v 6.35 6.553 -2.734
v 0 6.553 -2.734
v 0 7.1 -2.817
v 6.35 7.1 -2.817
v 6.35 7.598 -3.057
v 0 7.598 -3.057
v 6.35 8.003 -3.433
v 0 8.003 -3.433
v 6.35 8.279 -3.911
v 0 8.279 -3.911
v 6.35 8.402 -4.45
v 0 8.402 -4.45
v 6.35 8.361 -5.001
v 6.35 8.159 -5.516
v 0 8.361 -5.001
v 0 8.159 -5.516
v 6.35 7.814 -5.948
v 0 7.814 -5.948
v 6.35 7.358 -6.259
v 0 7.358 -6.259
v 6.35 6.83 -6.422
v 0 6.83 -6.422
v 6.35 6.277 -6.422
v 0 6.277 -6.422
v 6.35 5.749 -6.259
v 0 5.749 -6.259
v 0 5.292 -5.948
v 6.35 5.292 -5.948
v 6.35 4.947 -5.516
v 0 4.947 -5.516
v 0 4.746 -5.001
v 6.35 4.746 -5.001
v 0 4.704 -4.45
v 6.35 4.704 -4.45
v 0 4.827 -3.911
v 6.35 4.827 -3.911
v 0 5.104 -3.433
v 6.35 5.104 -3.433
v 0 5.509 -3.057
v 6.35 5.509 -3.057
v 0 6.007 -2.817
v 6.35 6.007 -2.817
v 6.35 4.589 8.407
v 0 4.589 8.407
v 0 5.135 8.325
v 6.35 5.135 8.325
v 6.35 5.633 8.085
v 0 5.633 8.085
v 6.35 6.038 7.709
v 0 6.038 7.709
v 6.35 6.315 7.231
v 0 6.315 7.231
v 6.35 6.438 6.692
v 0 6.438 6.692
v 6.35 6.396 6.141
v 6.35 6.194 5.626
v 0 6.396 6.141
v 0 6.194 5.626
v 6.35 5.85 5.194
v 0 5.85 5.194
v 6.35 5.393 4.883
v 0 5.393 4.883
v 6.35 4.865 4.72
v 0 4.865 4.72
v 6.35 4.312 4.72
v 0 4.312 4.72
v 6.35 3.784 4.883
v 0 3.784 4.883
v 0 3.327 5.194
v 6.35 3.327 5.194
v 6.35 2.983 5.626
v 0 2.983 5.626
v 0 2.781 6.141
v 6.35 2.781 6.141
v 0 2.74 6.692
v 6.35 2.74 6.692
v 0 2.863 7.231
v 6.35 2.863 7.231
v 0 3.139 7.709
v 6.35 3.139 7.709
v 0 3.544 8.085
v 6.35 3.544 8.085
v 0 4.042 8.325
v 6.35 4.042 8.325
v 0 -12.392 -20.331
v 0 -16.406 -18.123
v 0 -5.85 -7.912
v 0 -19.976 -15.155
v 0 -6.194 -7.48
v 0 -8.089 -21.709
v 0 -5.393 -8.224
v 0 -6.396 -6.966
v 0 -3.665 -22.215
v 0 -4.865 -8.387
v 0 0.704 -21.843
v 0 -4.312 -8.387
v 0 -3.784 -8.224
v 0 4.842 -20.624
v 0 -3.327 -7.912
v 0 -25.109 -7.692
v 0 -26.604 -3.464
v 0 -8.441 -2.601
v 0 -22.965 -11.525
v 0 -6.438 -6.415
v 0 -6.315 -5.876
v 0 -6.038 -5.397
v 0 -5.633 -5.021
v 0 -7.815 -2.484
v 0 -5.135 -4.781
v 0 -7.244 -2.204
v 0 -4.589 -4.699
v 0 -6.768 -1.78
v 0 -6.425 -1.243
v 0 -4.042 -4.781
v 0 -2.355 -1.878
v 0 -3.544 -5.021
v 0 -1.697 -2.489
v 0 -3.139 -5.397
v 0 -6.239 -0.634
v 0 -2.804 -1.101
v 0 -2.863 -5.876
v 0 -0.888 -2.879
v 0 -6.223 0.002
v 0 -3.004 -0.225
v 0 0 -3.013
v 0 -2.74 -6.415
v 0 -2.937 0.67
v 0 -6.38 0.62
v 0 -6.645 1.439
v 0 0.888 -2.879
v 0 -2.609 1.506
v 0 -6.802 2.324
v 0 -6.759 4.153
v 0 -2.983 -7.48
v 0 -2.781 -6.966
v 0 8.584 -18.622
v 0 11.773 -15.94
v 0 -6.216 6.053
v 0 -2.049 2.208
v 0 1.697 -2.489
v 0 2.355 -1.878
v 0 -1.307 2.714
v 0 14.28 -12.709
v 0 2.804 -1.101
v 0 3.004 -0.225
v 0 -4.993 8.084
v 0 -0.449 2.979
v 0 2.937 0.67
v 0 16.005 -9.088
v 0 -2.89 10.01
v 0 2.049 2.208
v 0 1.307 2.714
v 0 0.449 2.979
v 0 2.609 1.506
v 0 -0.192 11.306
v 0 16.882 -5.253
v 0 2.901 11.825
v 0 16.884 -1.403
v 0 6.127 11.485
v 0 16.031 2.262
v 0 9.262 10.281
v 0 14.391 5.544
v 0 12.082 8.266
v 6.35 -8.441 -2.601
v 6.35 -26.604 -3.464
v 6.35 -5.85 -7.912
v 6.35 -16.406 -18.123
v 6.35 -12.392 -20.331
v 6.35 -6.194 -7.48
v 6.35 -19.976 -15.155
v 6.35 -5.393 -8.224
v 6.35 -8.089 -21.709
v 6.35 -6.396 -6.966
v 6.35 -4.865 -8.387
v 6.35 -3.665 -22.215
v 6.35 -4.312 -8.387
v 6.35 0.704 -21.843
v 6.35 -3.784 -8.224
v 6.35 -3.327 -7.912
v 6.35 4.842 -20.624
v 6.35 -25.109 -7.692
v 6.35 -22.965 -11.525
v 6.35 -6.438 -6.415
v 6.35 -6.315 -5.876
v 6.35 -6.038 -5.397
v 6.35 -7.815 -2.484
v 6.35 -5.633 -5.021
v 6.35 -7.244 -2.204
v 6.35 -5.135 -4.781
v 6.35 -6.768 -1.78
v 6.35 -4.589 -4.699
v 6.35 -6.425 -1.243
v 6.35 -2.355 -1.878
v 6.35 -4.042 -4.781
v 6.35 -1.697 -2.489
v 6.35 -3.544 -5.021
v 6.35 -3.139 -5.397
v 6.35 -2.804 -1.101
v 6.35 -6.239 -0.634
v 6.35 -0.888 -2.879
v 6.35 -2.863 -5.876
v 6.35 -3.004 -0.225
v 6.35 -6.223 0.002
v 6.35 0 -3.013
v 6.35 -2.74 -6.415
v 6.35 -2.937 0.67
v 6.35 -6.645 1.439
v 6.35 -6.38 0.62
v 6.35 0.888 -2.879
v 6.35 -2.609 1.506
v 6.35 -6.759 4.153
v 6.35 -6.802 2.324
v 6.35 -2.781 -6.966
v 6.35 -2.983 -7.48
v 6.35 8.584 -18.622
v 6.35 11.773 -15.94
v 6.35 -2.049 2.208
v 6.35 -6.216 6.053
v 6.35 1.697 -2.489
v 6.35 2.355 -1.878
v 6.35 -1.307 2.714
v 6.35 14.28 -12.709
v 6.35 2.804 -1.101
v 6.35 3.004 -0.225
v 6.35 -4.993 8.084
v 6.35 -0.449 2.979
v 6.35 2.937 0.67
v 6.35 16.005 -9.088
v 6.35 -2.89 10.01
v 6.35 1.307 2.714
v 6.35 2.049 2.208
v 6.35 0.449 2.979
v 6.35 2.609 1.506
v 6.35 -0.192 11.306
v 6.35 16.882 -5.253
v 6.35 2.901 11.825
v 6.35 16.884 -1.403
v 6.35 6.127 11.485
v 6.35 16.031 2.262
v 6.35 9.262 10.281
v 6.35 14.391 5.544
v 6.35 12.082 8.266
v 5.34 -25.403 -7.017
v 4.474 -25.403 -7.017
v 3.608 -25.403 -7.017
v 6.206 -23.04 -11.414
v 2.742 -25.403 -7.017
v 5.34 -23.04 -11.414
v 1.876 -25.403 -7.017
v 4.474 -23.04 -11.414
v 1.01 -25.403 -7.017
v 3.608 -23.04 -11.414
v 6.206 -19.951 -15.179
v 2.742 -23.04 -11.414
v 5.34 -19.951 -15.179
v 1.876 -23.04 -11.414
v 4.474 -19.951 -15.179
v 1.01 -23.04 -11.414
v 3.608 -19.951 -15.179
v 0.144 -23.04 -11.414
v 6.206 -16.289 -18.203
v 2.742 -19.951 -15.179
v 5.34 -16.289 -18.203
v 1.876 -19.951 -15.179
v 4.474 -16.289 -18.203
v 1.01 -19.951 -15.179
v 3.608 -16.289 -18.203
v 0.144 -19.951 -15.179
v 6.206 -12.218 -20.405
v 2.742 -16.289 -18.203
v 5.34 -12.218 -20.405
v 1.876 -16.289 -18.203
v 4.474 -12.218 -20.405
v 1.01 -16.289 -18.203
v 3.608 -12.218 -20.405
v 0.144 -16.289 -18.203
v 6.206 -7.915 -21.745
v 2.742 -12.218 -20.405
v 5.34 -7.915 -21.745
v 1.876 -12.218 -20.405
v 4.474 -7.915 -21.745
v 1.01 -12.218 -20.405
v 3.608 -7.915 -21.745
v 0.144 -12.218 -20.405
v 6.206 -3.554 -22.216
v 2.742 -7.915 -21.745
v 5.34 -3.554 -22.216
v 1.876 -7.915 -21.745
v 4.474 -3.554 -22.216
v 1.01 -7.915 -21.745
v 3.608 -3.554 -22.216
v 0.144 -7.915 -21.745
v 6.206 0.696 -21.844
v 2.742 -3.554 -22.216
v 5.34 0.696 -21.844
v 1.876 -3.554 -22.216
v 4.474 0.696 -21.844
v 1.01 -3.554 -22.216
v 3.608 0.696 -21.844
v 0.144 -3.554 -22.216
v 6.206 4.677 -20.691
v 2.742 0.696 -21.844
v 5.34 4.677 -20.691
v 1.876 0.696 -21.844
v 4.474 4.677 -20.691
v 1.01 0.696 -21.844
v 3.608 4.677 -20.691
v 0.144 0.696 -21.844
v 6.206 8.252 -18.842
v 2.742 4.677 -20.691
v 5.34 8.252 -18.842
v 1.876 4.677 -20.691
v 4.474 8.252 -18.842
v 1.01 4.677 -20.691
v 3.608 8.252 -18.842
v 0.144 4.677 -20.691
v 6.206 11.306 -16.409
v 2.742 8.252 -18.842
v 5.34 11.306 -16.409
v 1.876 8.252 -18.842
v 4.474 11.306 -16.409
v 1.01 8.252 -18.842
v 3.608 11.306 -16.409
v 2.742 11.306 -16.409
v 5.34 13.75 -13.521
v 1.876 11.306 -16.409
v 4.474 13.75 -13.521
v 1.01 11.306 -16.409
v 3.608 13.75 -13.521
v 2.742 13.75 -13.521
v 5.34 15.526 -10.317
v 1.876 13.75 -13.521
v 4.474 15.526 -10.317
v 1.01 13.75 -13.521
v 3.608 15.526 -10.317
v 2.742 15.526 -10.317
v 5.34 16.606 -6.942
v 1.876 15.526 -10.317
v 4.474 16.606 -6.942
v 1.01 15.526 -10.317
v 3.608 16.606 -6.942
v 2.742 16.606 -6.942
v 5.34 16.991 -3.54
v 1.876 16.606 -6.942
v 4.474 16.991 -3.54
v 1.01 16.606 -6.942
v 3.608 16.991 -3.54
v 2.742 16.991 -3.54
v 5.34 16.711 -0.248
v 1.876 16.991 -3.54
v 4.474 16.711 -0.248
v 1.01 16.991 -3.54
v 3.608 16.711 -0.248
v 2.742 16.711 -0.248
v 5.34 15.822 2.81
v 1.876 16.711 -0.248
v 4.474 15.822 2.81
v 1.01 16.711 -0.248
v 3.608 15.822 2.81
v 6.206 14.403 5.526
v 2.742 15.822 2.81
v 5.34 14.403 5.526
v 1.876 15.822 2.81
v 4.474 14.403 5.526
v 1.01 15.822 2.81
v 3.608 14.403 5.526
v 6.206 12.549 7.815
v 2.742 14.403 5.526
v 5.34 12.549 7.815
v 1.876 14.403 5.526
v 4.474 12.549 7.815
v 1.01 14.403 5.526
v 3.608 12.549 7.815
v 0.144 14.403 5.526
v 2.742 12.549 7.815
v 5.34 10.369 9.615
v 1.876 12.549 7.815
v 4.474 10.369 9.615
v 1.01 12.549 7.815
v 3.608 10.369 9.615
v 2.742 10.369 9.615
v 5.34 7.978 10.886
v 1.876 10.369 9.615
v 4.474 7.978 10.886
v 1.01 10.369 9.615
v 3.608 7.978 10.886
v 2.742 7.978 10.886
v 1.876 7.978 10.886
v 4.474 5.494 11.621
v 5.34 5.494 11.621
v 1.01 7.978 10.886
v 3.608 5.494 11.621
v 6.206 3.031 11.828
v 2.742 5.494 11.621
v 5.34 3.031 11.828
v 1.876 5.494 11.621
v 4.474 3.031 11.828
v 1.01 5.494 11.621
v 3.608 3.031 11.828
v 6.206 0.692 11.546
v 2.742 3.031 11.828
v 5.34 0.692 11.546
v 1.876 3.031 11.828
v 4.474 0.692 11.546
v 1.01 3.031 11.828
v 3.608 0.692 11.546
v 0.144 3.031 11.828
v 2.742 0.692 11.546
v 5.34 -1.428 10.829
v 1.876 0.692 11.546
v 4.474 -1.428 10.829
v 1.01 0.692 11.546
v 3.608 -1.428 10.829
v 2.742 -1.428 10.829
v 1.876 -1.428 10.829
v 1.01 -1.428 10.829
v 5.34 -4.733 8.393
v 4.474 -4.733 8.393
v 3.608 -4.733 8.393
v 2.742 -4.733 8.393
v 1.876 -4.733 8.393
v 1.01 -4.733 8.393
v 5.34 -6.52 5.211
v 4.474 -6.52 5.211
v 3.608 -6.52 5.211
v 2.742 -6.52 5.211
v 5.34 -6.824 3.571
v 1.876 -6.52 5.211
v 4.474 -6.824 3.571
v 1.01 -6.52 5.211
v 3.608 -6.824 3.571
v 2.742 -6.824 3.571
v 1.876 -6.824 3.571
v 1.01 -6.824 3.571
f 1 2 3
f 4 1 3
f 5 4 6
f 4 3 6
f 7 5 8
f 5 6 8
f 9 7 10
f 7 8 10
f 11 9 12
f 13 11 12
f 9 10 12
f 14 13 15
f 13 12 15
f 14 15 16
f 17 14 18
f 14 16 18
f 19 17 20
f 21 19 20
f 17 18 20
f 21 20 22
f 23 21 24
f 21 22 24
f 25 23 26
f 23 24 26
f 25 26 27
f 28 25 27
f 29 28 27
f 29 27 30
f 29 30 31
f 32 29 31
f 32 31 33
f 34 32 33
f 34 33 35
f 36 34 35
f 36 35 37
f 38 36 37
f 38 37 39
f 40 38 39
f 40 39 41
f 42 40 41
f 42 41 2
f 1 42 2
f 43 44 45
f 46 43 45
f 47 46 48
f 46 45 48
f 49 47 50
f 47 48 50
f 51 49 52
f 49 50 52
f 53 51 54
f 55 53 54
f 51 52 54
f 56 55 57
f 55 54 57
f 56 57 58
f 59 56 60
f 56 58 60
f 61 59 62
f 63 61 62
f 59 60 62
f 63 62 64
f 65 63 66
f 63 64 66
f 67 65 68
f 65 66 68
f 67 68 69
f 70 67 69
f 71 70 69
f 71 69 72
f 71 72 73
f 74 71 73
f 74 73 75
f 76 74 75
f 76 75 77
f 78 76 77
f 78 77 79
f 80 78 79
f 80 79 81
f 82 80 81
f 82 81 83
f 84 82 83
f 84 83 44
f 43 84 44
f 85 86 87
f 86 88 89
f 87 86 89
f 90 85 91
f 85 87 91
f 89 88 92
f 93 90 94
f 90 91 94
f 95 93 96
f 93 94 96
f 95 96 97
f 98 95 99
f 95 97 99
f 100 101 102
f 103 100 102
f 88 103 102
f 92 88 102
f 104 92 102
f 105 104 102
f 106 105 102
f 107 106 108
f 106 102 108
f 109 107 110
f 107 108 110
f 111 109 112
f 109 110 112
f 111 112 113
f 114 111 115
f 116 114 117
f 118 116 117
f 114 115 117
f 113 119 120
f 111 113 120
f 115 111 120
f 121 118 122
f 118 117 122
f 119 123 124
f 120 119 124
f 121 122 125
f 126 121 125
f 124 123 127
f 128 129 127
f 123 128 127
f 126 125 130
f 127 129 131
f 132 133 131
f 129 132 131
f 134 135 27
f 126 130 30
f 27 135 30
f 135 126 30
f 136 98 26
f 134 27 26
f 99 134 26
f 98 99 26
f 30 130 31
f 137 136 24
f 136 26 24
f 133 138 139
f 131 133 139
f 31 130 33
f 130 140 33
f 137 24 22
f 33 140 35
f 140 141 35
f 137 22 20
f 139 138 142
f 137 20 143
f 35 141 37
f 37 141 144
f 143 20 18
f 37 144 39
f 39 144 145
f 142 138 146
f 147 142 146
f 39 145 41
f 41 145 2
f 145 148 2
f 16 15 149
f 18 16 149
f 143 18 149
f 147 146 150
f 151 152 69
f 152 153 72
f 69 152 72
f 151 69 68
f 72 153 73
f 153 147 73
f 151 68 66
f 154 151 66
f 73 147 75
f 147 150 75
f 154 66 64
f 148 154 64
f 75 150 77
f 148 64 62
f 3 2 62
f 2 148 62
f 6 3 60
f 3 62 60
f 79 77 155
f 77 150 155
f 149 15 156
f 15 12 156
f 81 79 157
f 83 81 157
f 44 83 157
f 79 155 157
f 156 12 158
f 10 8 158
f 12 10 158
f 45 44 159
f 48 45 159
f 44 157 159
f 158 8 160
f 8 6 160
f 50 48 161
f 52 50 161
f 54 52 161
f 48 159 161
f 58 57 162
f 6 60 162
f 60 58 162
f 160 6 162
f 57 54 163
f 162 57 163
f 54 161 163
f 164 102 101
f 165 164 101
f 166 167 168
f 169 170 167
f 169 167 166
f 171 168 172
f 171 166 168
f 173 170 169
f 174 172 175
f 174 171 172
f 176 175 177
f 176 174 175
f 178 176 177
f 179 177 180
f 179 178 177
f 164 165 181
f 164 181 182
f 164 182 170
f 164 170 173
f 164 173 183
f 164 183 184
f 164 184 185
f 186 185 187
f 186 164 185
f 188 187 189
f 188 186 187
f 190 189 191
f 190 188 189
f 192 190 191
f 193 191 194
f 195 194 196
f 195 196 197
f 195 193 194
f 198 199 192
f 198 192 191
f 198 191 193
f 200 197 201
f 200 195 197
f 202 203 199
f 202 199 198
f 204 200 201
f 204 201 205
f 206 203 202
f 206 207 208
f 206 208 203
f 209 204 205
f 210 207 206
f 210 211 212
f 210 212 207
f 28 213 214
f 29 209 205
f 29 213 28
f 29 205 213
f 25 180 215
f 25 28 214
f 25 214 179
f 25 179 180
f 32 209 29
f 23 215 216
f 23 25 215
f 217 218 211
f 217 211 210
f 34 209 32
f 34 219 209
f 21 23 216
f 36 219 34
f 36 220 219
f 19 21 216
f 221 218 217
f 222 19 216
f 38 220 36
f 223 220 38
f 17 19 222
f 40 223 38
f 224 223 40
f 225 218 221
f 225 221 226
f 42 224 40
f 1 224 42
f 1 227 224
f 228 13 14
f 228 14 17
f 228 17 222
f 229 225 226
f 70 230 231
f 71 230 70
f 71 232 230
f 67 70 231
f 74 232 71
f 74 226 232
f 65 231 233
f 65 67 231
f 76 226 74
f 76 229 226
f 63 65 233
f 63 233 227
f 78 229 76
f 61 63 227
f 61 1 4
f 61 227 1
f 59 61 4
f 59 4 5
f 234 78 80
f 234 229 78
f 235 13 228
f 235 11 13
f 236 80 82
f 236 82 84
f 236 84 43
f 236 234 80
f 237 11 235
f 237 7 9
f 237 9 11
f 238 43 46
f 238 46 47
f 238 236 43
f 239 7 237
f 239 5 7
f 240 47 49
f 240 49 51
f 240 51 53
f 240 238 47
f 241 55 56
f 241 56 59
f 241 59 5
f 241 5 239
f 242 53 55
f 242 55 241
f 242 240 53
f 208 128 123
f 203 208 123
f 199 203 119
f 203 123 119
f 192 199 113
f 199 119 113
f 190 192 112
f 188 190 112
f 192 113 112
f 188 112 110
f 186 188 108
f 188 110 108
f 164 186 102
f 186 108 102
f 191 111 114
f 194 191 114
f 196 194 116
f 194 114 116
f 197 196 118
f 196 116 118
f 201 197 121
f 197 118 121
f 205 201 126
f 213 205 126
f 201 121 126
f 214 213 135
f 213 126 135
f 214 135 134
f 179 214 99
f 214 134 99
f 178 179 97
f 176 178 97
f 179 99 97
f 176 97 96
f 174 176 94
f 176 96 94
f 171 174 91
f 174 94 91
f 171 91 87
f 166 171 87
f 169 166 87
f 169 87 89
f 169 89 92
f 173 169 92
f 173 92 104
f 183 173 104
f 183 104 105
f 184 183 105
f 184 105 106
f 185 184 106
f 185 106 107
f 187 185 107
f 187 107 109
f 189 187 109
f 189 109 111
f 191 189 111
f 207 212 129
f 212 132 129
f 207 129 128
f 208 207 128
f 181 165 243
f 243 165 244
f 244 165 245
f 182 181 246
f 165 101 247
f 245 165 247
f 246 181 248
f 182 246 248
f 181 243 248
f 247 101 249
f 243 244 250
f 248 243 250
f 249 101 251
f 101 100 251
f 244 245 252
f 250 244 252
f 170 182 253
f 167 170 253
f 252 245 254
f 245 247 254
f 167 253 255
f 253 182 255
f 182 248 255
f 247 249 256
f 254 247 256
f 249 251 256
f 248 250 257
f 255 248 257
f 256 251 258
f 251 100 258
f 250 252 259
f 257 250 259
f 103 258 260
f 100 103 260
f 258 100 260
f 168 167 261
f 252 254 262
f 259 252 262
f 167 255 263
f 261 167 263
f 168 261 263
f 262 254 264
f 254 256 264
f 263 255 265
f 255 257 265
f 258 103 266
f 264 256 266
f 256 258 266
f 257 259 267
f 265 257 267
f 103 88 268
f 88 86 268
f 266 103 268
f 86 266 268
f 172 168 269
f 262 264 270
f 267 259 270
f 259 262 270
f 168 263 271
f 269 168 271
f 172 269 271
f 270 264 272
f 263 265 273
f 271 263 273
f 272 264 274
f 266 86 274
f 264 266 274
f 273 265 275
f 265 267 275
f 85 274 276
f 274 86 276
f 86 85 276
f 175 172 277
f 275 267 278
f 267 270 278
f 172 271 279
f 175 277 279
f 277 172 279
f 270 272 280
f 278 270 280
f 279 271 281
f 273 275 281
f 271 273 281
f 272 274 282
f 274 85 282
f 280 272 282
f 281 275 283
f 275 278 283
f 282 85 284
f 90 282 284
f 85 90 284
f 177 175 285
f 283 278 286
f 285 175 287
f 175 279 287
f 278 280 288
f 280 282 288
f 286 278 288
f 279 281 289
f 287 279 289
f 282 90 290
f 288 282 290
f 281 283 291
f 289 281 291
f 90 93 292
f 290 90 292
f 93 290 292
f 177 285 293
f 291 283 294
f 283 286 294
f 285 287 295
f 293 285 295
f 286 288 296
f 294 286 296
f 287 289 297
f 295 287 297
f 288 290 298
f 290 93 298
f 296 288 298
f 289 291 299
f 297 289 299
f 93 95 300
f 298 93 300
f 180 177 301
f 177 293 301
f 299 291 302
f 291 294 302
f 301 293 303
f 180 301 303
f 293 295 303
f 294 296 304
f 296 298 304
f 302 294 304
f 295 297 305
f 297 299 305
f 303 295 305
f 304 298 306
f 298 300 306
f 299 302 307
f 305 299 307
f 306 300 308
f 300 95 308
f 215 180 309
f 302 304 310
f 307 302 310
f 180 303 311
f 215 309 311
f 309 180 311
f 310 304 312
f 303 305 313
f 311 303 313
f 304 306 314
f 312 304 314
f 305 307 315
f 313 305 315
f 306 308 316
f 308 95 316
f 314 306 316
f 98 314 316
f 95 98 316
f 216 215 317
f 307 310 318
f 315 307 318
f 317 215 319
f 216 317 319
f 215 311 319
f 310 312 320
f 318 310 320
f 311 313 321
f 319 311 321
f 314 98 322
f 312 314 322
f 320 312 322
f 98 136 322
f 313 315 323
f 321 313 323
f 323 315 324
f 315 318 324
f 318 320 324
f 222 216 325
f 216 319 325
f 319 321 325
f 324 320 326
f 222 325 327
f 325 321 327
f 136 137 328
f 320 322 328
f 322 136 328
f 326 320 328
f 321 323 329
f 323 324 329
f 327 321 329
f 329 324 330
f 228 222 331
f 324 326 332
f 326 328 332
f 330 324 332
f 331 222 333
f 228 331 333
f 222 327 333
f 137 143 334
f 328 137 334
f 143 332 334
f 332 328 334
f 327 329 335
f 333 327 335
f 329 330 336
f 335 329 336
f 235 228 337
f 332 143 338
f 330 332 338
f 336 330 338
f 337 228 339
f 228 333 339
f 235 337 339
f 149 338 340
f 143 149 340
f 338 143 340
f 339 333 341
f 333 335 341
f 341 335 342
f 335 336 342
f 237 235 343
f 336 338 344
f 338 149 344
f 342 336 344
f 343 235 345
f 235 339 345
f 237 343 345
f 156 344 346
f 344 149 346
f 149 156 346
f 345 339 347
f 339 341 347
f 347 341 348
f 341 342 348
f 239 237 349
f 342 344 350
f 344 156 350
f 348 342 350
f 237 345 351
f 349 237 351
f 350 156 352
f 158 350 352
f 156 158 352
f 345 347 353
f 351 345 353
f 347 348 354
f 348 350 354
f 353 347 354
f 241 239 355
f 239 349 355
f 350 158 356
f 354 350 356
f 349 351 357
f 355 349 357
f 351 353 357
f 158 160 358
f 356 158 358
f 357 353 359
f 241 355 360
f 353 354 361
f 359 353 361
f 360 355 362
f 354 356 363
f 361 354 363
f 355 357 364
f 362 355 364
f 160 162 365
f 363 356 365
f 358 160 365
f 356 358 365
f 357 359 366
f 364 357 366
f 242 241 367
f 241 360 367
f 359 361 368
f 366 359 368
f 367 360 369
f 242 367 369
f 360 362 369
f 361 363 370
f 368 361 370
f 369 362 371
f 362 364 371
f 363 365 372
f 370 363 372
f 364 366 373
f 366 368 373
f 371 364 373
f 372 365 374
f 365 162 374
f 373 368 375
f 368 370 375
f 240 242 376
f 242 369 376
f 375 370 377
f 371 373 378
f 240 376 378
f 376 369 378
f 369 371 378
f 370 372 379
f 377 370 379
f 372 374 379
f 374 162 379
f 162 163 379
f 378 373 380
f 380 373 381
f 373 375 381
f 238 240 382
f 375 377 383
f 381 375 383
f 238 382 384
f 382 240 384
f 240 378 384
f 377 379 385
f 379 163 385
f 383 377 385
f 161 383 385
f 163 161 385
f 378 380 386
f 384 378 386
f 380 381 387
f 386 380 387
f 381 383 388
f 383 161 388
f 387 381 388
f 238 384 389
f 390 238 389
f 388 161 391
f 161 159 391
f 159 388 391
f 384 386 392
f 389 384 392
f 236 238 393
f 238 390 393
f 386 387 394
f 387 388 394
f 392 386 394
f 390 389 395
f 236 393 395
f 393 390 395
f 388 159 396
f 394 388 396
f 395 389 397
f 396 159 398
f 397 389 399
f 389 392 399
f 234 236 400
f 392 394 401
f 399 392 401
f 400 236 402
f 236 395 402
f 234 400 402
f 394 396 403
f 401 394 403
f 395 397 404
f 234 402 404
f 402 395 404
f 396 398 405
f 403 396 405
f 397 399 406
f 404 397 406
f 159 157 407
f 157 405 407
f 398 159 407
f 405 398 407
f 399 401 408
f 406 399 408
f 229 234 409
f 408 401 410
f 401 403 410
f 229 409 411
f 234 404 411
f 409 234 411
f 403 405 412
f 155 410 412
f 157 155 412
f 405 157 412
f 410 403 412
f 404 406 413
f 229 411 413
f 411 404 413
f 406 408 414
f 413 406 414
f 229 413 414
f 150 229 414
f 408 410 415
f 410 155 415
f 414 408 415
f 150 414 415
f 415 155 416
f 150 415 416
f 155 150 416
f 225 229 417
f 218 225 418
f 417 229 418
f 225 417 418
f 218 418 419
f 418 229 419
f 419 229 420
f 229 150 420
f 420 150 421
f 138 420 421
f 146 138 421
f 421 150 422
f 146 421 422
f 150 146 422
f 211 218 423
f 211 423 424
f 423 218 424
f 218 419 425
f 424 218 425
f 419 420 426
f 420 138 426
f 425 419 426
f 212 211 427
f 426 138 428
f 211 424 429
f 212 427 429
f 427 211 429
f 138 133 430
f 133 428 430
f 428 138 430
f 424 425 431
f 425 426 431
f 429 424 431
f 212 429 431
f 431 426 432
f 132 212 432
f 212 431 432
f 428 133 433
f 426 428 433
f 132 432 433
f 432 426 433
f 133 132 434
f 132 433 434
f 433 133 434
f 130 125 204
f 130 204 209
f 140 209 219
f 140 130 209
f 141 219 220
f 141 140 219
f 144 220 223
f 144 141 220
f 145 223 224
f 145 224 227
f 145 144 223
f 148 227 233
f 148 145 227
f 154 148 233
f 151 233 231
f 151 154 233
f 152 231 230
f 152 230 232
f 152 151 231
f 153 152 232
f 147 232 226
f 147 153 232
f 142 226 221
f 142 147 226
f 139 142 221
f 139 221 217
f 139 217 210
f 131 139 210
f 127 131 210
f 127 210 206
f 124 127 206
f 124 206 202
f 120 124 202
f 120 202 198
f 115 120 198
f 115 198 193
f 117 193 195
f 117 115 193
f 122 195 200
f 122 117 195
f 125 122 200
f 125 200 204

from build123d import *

# Parameters (mm, degrees)
SKETCH4_R           = 3.012699969
BOSS_EXTRUDE1_DEPTH = 6.35
MOVE_FACE1_DEPTH    = 6.35
SKETCH11_R          = 1.8542
CUT_EXTRUDE2_DEPTH  = 36.237722546


# Read off the part's stored shape, not the designer's step: Move Face1
with BuildPart() as part:
    # Sketch4 → Boss-Extrude1 (new body)
    with BuildSketch(Plane(origin=(0, 0, 0), x_dir=(0, 0, -1), z_dir=(1, 0, 0))):
        with BuildLine():
            Line((3.667013126, -26.3254835), (2.816473307, -8.431236894))
            ThreePointArc((2.816473307, -8.431236894), (1.639602622, -6.396649217), (-0.700777066, -6.179406175))
            add(Edge.make_bspline(
                [(-0.700777066, -6.179406175), (-1.525102008, -6.512822326), (-2.494871997, -6.679047096), (-4.555429578, -6.54165034), (-5.644996058, -6.237076936), (-7.717261628, -5.106975392), (-8.698405735, -4.281093265), (-10.311829803, -2.164612563), (-10.942499326, -0.874358563), (-11.647480976, 2.006859472), (-11.720427957, 3.596803483), (-11.182779689, 6.826310345), (-10.571334953, 8.46432492), (-9.132019695, 10.73433891), (-8.566197708, 11.459621106), (-7.273120414, 12.810057002), (-6.545872807, 13.435152517), (-4.948692799, 14.549748502), (-4.078780417, 15.039192621), (-2.22269385, 15.85074605), (-1.236551533, 16.172803424), (0.818678144, 16.623204755), (1.887722789, 16.751503646), (4.069669804, 16.79483508), (5.182520117, 16.709831654), (7.408648574, 16.315055224), (8.521867273, 16.00525724), (10.70264063, 15.158359498), (11.770130786, 14.621247223), (13.812561896, 13.326727542), (14.787435905, 12.56932106), (16.598938448, 10.850935673), (17.435500393, 9.889971566), (18.927885533, 7.790674993), (19.583645356, 6.652371052), (20.677096627, 4.233429246), (21.114730733, 2.952832896), (21.741586229, 0.292117033), (21.930758945, -1.087949282), (22.038932986, -3.898444365), (21.957896657, -5.328810088), (21.513783431, -8.186144708), (21.150681858, -9.613043017), (20.141400668, -12.407098951), (19.49521083, -13.774181132), (17.930076055, -16.391877744), (17.011136269, -17.642414844), (14.922264044, -19.972214517), (13.752352434, -21.051401006), (11.194349378, -22.98792657), (9.80629411, -23.845193985), (6.855009859, -25.29377098), (5.291831431, -25.88501641), (3.667013126, -26.3254835)],
                knots=[0, 0, 0, 0, 0.0625, 0.0625, 0.125, 0.125, 0.1875, 0.1875, 0.25, 0.25, 0.3125, 0.3125, 0.375, 0.375, 0.40625, 0.40625, 0.4375, 0.4375, 0.46875, 0.46875, 0.5, 0.5, 0.53125, 0.53125, 0.5625, 0.5625, 0.59375, 0.59375, 0.625, 0.625, 0.65625, 0.65625, 0.6875, 0.6875, 0.71875, 0.71875, 0.75, 0.75, 0.78125, 0.78125, 0.8125, 0.8125, 0.84375, 0.84375, 0.875, 0.875, 0.90625, 0.90625, 0.9375, 0.9375, 0.96875, 0.96875, 1, 1, 1, 1], degree=3))
        make_face()
        Circle(SKETCH4_R, mode=Mode.SUBTRACT)
    extrude(amount=BOSS_EXTRUDE1_DEPTH)

    # Move Face1 outline → Move Face1 (add)
    with BuildSketch(Plane.YZ):
        with BuildLine():
            Line((-8.441487365, -2.600816779), (-26.604178645, -3.464116168))
            add(Edge.make_bspline(
                [(-26.604178645, -3.464116168), (-26.599569003, -3.481120458), (-26.594959362, -3.498124748), (-26.59034972, -3.515129038), (-26.585740078, -3.532133328), (-26.581130437, -3.549137618), (-26.576520795, -3.566141908), (-26.571911153, -3.583146198), (-26.567301512, -3.600150488), (-26.56269187, -3.617154778), (-26.558082228, -3.634159068), (-26.553472587, -3.651163358), (-26.548862945, -3.668167648), (-26.544253303, -3.685171938), (-26.53927128, -3.703549889), (-26.538898899, -3.704923549), (-26.538526517, -3.70629721), (-26.538154136, -3.707670871), (-26.537781754, -3.709044531), (-26.537409373, -3.710418192), (-26.537036991, -3.711791852), (-26.53666461, -3.713165513), (-26.536292228, -3.714539173), (-26.535919847, -3.715912834), (-26.535547465, -3.717286495), (-26.535175084, -3.718660155), (-26.534802702, -3.720033816), (-26.53424413, -3.722094307), (-26.534059907, -3.722773916), (-26.533858021, -3.723518442), (-26.533727067, -3.724001851), (-26.533440048, -3.725060798), (-26.533340537, -3.725426825), (-26.533133021, -3.726192717), (-26.532893488, -3.727076218), (-26.532782162, -3.727485594), (-26.532537582, -3.728388165), (-26.532375797, -3.728983938), (-26.532180677, -3.729703197), (-26.531993743, -3.730392017), (-26.531617908, -3.731776793), (-26.531429971, -3.732469173), (-26.531242014, -3.733161545), (-26.531054038, -3.733853909), (-26.530866042, -3.734546265), (-26.530678027, -3.735238614), (-26.530489992, -3.735930954), (-26.530301938, -3.736623286), (-26.530113864, -3.73731561), (-26.529925771, -3.738007927), (-26.529737659, -3.738700235), (-26.529549527, -3.739392535), (-26.529361375, -3.740084828), (-26.528420519, -3.74354625), (-26.527667523, -3.74631526), (-26.526914215, -3.749084142), (-26.526160594, -3.751852897), (-26.525406663, -3.754621524), (-26.524652417, -3.757390023), (-26.523897864, -3.760158394), (-26.523142994, -3.762926638), (-26.522387816, -3.765694753), (-26.521632324, -3.768462741), (-26.520876522, -3.7712306), (-26.520120408, -3.773998332), (-26.519363982, -3.776765936), (-26.517093769, -3.785068362), (-26.515579047, -3.790602801), (-26.514063078, -3.796136728), (-26.512545864, -3.801670141), (-26.511027403, -3.807203041), (-26.509507697, -3.812735429), (-26.507986745, -3.818267302), (-26.506464548, -3.823798661), (-26.504941106, -3.829329506), (-26.503416418, -3.834859837), (-26.501890486, -3.840389653), (-26.500363309, -3.845918954), (-26.498834888, -3.85144774), (-26.494245891, -3.868032549), (-26.491181583, -3.879087027), (-26.488112299, -3.890139439), (-26.485038042, -3.901189785), (-26.481958812, -3.912238061), (-26.478874612, -3.923284266), (-26.475785441, -3.934328398), (-26.472691304, -3.945370453), (-26.4695922, -3.956410431), (-26.466488131, -3.967448328), (-26.463379099, -3.978484142), (-26.460265106, -3.989517871), (-26.457146153, -4.000549514), (-26.441526593, -4.055697279), (-26.428951609, -4.099782062), (-26.416297387, -4.143833272), (-26.403564026, -4.187850766), (-26.390751622, -4.2318344), (-26.377860278, -4.275784033), (-26.364890086, -4.31969952), (-26.351841151, -4.363580717), (-26.338713566, -4.407427483), (-26.325507433, -4.451239673), (-26.312222848, -4.495017144), (-26.298859911, -4.538759754), (-26.285418719, -4.582467358), (-26.217821979, -4.800829638), (-26.162494118, -4.974957082), (-26.105922065, -5.148512984), (-26.048112096, -5.321488181), (-25.989070491, -5.49387351), (-25.928803524, -5.665659807), (-25.867317478, -5.836837911), (-25.804618624, -6.007398657), (-25.740713246, -6.177332884), (-25.675607616, -6.346631428), (-25.609308015, -6.515285126), (-25.541820718, -6.683284815), (-25.473152005, -6.850621333), (-25.263620445, -7.350613883), (-25.119234857, -7.681244245), (-24.970181526, -8.009184855), (-24.816563128, -8.334008567), (-24.658405438, -8.656540908), (-24.495574442, -8.975326705), (-24.328540305, -9.291435032), (-24.157090549, -9.604622916), (-23.981161893, -9.914157206), (-23.801250109, -10.220890306), (-23.616969066, -10.524098117), (-23.428657045, -10.824036045), (-23.23626742, -11.120542818), (-22.843508974, -11.706612059), (-22.643142176, -11.996174333), (-22.438808393, -12.282198027), (-22.230723583, -12.56460565), (-22.018648797, -12.843459923), (-21.802917467, -13.118447754), (-21.583605212, -13.389644606), (-21.360601243, -13.657176078), (-21.134077845, -13.920797741), (-20.904199437, -14.180403567), (-20.670850853, -14.43621903), (-20.434249131, -14.687936687), (-20.194399706, -14.935644556), (-19.70838235, -15.42287054), (-19.462215458, -15.662397811), (-19.212931723, -15.897766285), (-18.960728671, -16.128991264), (-18.70539447, -16.355994955), (-18.447304202, -16.578625492), (-18.186499944, -16.796967202), (-17.922857209, -17.011060359), (-17.656599224, -17.220738444), (-17.387896766, -17.42596103), (-17.116588056, -17.626860373), (-16.842954408, -17.82323191), (-16.566974945, -18.015139117), (-16.010532784, -18.389907039), (-15.730066911, -18.572777232), (-15.447424653, -18.751061226), (-15.162746667, -18.924851219), (-14.875916093, -19.093949929), (-14.587276398, -19.258367365), (-14.296840097, -19.418183126), (-14.004513923, -19.573354608), (-13.710535007, -19.723805382), (-13.415054471, -19.869556513), (-13.117916757, -20.010637113), (-12.819417073, -20.146961011), (-12.519527346, -20.278558541), (-11.917189037, -20.532242336), (-11.614733643, -20.65433651), (-11.311086848, -20.771622769), (-11.006314451, -20.884236095), (-10.700430715, -20.991914806), (-10.39369458, -21.094796517), (-10.086097937, -21.192946197), (-9.777608438, -21.286263743), (-9.468444303, -21.374756831), (-9.158720169, -21.458492374), (-8.848328151, -21.537414262), (-8.537533287, -21.611545146), (-8.226317575, -21.68088471), (-7.603260387, -21.809981168), (-7.291409675, -21.869743076), (-6.979352707, -21.924681004), (-6.667077965, -21.974937355), (-6.354741362, -22.020247701), (-6.042483137, -22.060828702), (-5.730286129, -22.096726163), (-5.418195248, -22.127815836), (-5.10638259, -22.154172495), (-4.794917194, -22.175889882), (-4.483768614, -22.19285834), (-4.173135796, -22.205184806), (-3.863025065, -22.212847752), (-3.244042, -22.218898546), (-2.935160635, -22.217283683), (-2.627009812, -22.211051294), (-2.319535889, -22.200221076), (-2.012978585, -22.184764162), (-1.707390049, -22.164745089), (-1.402745405, -22.140231054), (-1.099140461, -22.111224435), (-0.796711927, -22.077727229), (-0.495491172, -22.03980106), (-0.195495425, -21.997498698), (0.103120125, -21.950796576), (0.400341286, -21.899765548), (0.991819558, -21.789077387), (1.28608355, -21.729419077), (1.578768432, -21.665496674), (1.869917455, -21.597302553), (2.159298453, -21.524877058), (2.446882891, -21.44828864), (2.732707168, -21.367584679), (3.016672969, -21.282790594), (3.298648908, -21.193943649), (3.578623787, -21.101102717), (3.85659217, -21.004314712), (4.132391722, -20.903599993), (4.406031128, -20.799020335), (4.948821205, -20.582201458), (5.217977174, -20.469959264), (5.484813738, -20.353954278), (5.749350964, -20.234161295), (6.01138819, -20.110681465), (6.270917632, -19.983580155), (6.527976619, -19.852885482), (6.782472092, -19.718646938), (7.034289441, -19.580933449), (7.283432367, -19.43979613), (7.529901875, -19.295274808), (7.77354503, -19.147434253), (8.014385292, -18.996321733), (8.490309508, -18.687660003), (8.725396651, -18.530106846), (8.957555599, -18.369412167), (9.186776625, -18.205547192), (9.412909718, -18.038656901), (9.635962414, -17.868799381), (9.855964095, -17.695988596), (10.072835585, -17.520295455), (10.286488685, -17.341812823), (10.496935081, -17.160582706), (10.704177349, -16.976639307), (10.908088748, -16.790084702), (11.108697582, -16.60095136), (11.503188846, -16.217665056), (11.697072069, -16.023508272), (11.887567215, -15.826919792), (12.074634411, -15.627883555), (12.258185431, -15.42656542), (12.438237852, -15.223014525), (12.614807781, -15.017239038), (12.787836646, -14.809325702), (12.957268738, -14.599380603), (13.123118176, -14.387438261), (13.285386007, -14.173530705), (13.443983714, -13.9577844), (13.598936774, -13.740220791), (13.901469825, -13.301617581), (14.049048428, -13.080575457), (14.192938252, -12.85786673), (14.333075884, -12.633504041), (14.469436513, -12.407648424), (14.602043246, -12.180340569), (14.730898025, -11.951592848), (14.855967044, -11.721500116), (14.977228845, -11.490169384), (15.094696526, -11.257631481), (15.208368824, -11.023920803), (15.318201343, -10.789171515), (15.424212302, -10.553400689), (15.62854924, -10.079983096), (15.726872378, -9.842336108), (15.821368333, -9.603809457), (15.911963677, -9.364456828), (15.998688398, -9.124410274), (16.081568069, -8.883704025), (16.160594519, -8.642364015), (16.235759672, -8.400484565), (16.307073362, -8.15816166), (16.374546973, -7.915427103), (16.438178826, -7.672322007), (16.497967314, -7.428970727), (16.553923089, -7.185393613), (16.658169192, -6.697950384), (16.706458163, -6.454088263), (16.750931294, -6.210116308), (16.791551227, -5.966156004), (16.828352164, -5.722265003), (16.861371473, -5.478483856), (16.89061727, -5.234873215), (16.916091026, -4.991505669), (16.937812625, -4.748444975), (16.955811803, -4.505744551), (16.970101403, -4.263463823), (16.98068149, -4.021672476), (16.987586075, -3.780425869), (16.994060031, -3.299148156), (16.993631026, -3.059123221), (16.989555385, -2.819737011), (16.981828074, -2.581119041), (16.97049256, -2.343310945), (16.955590155, -2.106340667), (16.937140606, -1.870268338), (16.91516095, -1.635166239), (16.889682937, -1.401088709), (16.860744509, -1.168076804), (16.828369507, -0.936186685), (16.792572797, -0.705489655), (16.753396921, -0.476025059), (16.668327332, -0.019684131), (16.622436928, 0.207187985), (16.573210516, 0.43274012), (16.520676595, 0.656845924), (16.464882551, 0.879479604), (16.405870334, 1.100624284), (16.3436718, 1.320223268), (16.278319602, 1.538208936), (16.209854217, 1.754538123), (16.138317988, 1.969182142), (16.063745228, 2.182090339), (15.986166539, 2.393194111), (15.905627626, 2.602469813), (15.738694717, 3.017250287), (15.652304686, 3.222753348), (15.563011722, 3.426348397), (15.470874943, 3.627923175), (15.375941264, 3.827466031), (15.27825116, 4.024968988), (15.177848129, 4.22038201), (15.074779017, 4.413646484), (14.969089842, 4.604731213), (14.860824208, 4.793618869), (14.750025822, 4.980266585), (14.6367404, 5.164613119), (14.521012434, 5.346648599), (14.284759964, 5.705997611), (14.164238936, 5.88331198), (14.041346931, 6.058244698), (13.916166576, 6.230707349), (13.788741729, 6.400699169), (13.659110682, 6.568218603), (13.527326668, 6.733225876), (13.393447683, 6.895675454), (13.257522548, 7.055547765), (13.11959423, 7.212834846), (12.979713874, 7.367503996), (12.837939646, 7.519506253), (12.694312503, 7.668841812), (12.403459758, 7.962101433), (12.256236093, 8.106028416), (12.107245062, 8.247230378), (11.956582639, 8.385649016), (11.804288588, 8.521291455), (11.65039943, 8.654160681), (11.494975113, 8.78422985), (11.338080513, 8.911469301), (11.179764974, 9.035870418), (11.020069941, 9.157432821), (10.859051406, 9.276135657), (10.696775757, 9.391945779), (10.53327979, 9.504870215), (10.348041361, 9.62863484), (10.327440973, 9.642341074), (10.306822731, 9.656001739), (10.286186731, 9.669616814), (10.265532905, 9.683186339), (10.244861188, 9.696710349), (10.224171615, 9.710188832), (10.203464367, 9.723621723), (10.182739741, 9.737008906), (10.161998068, 9.750350261), (10.141239561, 9.763645725), (10.12046411, 9.776895389), (10.099671, 9.79009961), (10.058046161, 9.81641871), (10.037217098, 9.829531834), (10.016371494, 9.842598537), (9.995509453, 9.855618821), (9.974631077, 9.868592692), (9.953736471, 9.881520152), (9.932825737, 9.894401206), (9.911898978, 9.907235857), (9.890956298, 9.920024109), (9.869997801, 9.932765967), (9.849023589, 9.945461434), (9.828033765, 9.958110514), (9.807028434, 9.97071321), (9.743966224, 10.00838216), (9.701863133, 10.033309276), (9.659699249, 10.058050905), (9.617475395, 10.082607077), (9.575192397, 10.106977826), (9.532851077, 10.131163181), (9.490452261, 10.155163174), (9.447996771, 10.178977836), (9.405485434, 10.202607198), (9.362919072, 10.226051291), (9.320298511, 10.249310147), (9.277624573, 10.272383796), (9.234898083, 10.29527227), (9.106563432, 10.363382261), (9.020800116, 10.408048353), (8.934836483, 10.451974125), (8.848679096, 10.495159823), (8.762334519, 10.537605698), (8.675809318, 10.579311995), (8.589110055, 10.620278965), (8.502243296, 10.660506853), (8.415215603, 10.699995909), (8.328033542, 10.73874638), (8.240703676, 10.776758515), (8.15323257, 10.814032561), (8.065626787, 10.850568766), (7.802425101, 10.957964605), (7.626444742, 11.026611369), (7.450004147, 11.092309662), (7.27315561, 11.155061426), (7.095951384, 11.214868552), (6.918443686, 11.271732888), (6.740684687, 11.325656229), (6.562726523, 11.376640328), (6.384621288, 11.424686885), (6.206421038, 11.469797554), (6.028177787, 11.511973941), (5.84994351, 11.551217606), (5.671770144, 11.587530057), (5.315649022, 11.654295458), (5.137728602, 11.684747226), (4.959700016, 11.712299475), (4.783019884, 11.736712222), (4.604276011, 11.758891306), (4.429464411, 11.777036031), (4.250811556, 11.793890793), (4.076436597, 11.806370641), (3.899761626, 11.817263639), (3.725133165, 11.824666119), (3.550410334, 11.829638498), (3.37648165, 11.831780195), (3.203155326, 11.831236863), (2.857881444, 11.824777298), (2.685930065, 11.818863209), (2.51470827, 11.810286856), (2.344260063, 11.799070213), (2.174629427, 11.785235191), (2.005860324, 11.768803637), (1.837996698, 11.749797331), (1.671082472, 11.728237989), (1.50516155, 11.704147262), (1.340277816, 11.677546737), (1.176475132, 11.648457935), (1.013797343, 11.616902313), (0.852288272, 11.582901263), (0.61184345, 11.528263534), (0.53200571, 11.509447542), (0.452431498, 11.490014724), (0.373262519, 11.470000825), (0.294382178, 11.449393041), (0.215797381, 11.428191413), (0.137577788, 11.406409742), (0.059709652, 11.384053465), (-0.017850954, 11.361120913), (-0.095072103, 11.33761765), (-0.171912733, 11.313553202), (-0.248433789, 11.288926884), (-0.324588602, 11.263745774), (-0.476187787, 11.21228181), (-0.551629997, 11.185999058), (-0.626711201, 11.159170067), (-0.701427774, 11.131799368), (-0.775776089, 11.103891494), (-0.849752523, 11.075450975), (-0.92335345, 11.046482344), (-0.996575245, 11.016990131), (-1.069414282, 10.986978867), (-1.141866938, 10.956453085), (-1.213929586, 10.925417316), (-1.285598602, 10.89387609), (-1.35687036, 10.86183394), (-1.569482988, 10.764218312), (-1.709621229, 10.697155476), (-1.848127108, 10.628143005), (-1.98497177, 10.557216936), (-2.120126347, 10.484413233), (-2.253561967, 10.409767786), (-2.385249746, 10.333316406), (-2.515160795, 10.255094835), (-2.643266216, 10.175138734), (-2.769537102, 10.093483694), (-2.893944539, 10.010165228), (-3.016459604, 9.925218776), (-3.137053367, 9.838679702), (-3.315018649, 9.706535092), (-3.373849905, 9.662101445), (-3.432225085, 9.617246491), (-3.489973308, 9.572127532), (-3.547384771, 9.52651408), (-3.604222119, 9.480589049), (-3.660493818, 9.43435795), (-3.716362737, 9.387700649), (-3.771715305, 9.340702599), (-3.826473613, 9.293429538), (-3.880830859, 9.245743042), (-3.934616774, 9.197770987), (-3.987913252, 9.149459099), (-4.093478067, 9.052199488), (-4.145749357, 9.003249721), (-4.19750826, 8.953985292), (-4.248753506, 8.904411497), (-4.299483825, 8.854533635), (-4.349697947, 8.804357003), (-4.399394603, 8.753886901), (-4.448572522, 8.703128624), (-4.497230434, 8.652087473), (-4.545367069, 8.600768744), (-4.592981158, 8.549177736), (-4.640071431, 8.497319746), (-4.686636617, 8.445200073), (-4.824753105, 8.288071896), (-4.914725275, 8.182294046), (-5.002581891, 8.075532644), (-5.088312844, 7.967829797), (-5.171907984, 7.859227538), (-5.253357116, 7.749767825), (-5.332650002, 7.639492543), (-5.409776362, 7.528443501), (-5.48472587, 7.416662437), (-5.55748816, 7.304191013), (-5.628052821, 7.191070818), (-5.696409398, 7.077343365), (-5.762547394, 6.963050096), (-5.890365144, 6.733414655), (-5.952053709, 6.61804774), (-6.011379226, 6.5024593), (-6.068789532, 6.385932229), (-6.123482319, 6.2698429), (-6.176476599, 6.152615371), (-6.226996856, 6.035513752), (-6.275228474, 5.918322644), (-6.321621575, 5.800380212), (-6.365473581, 5.682832438), (-6.407390636, 5.564799764), (-6.447052072, 5.446825396), (-6.484587524, 5.328765169), (-6.55536853, 5.092635858), (-6.588616961, 4.974562342), (-6.619731944, 4.856519728), (-6.64872202, 4.73854772), (-6.675595644, 4.620685966), (-6.700361191, 4.50297406), (-6.723026952, 4.385451536), (-6.743601132, 4.268157874), (-6.762091856, 4.151132495), (-6.778507164, 4.034414767), (-6.792855012, 3.918043998), (-6.805143275, 3.802059442), (-6.815379741, 3.686500296), (-6.839956872, 3.341216503), (-6.848154204, 3.113073347), (-6.848438469, 2.887099769), (-6.84084938, 2.663718746), (-6.825763132, 2.443005573), (-6.803253008, 2.225285636), (-6.773501282, 2.01082461), (-6.73678547, 1.799796855), (-6.69324338, 1.592468222), (-6.643018498, 1.389115017), (-6.586393416, 1.18991247), (-6.52346955, 0.995146747), (-6.454467342, 0.805035191), (-6.379554183, 0.619822851)],
                knots=[-0.001662915, -0.001662915, -0.001662915, -0.001662915, -0.001662915, -0.001662915, -0.001662915, -0.001662915, -0.001662915, -0.001662915, -0.001662915, -0.001662915, -0.001662915, -0.001662915, -0.001662915, -0.000136719, -0.000136719, -0.000136719, -0.000136719, -0.000136719, -0.000136719, -0.000136719, -0.000136719, -0.000136719, -0.000136719, -0.000136719, -0.000136719, -0.000136719, -1.3428e-05, -1.3428e-05, -1.3428e-05, -1.3428e-05, -1.3428e-05, -1.3428e-05, -1.3428e-05, -1.3428e-05, -1.3428e-05, -1.3428e-05, -1.3428e-05, -1.3428e-05, -1.3428e-05, 4.8218e-05, 4.8218e-05, 4.8218e-05, 4.8218e-05, 4.8218e-05, 4.8218e-05, 4.8218e-05, 4.8218e-05, 4.8218e-05, 4.8218e-05, 4.8218e-05, 4.8218e-05, 4.8218e-05, 0.000109863, 0.000109863, 0.000109863, 0.000109863, 0.000109863, 0.000109863, 0.000109863, 0.000109863, 0.000109863, 0.000109863, 0.000109863, 0.000109863, 0.000109863, 0.000356445, 0.000356445, 0.000356445, 0.000356445, 0.000356445, 0.000356445, 0.000356445, 0.000356445, 0.000356445, 0.000356445, 0.000356445, 0.000356445, 0.000356445, 0.000849609, 0.000849609, 0.000849609, 0.000849609, 0.000849609, 0.000849609, 0.000849609, 0.000849609, 0.000849609, 0.000849609, 0.000849609, 0.000849609, 0.000849609, 0.001835937, 0.001835937, 0.001835937, 0.001835937, 0.001835937, 0.001835937, 0.001835937, 0.001835937, 0.001835937, 0.001835937, 0.001835937, 0.001835937, 0.001835937, 0.00578125, 0.00578125, 0.00578125, 0.00578125, 0.00578125, 0.00578125, 0.00578125, 0.00578125, 0.00578125, 0.00578125, 0.00578125, 0.00578125, 0.00578125, 0.0215625, 0.0215625, 0.0215625, 0.0215625, 0.0215625, 0.0215625, 0.0215625, 0.0215625, 0.0215625, 0.0215625, 0.0215625, 0.0215625, 0.0215625, 0.053125, 0.053125, 0.053125, 0.053125, 0.053125, 0.053125, 0.053125, 0.053125, 0.053125, 0.053125, 0.053125, 0.053125, 0.053125, 0.0846875, 0.0846875, 0.0846875, 0.0846875, 0.0846875, 0.0846875, 0.0846875, 0.0846875, 0.0846875, 0.0846875, 0.0846875, 0.0846875, 0.0846875, 0.11625, 0.11625, 0.11625, 0.11625, 0.11625, 0.11625, 0.11625, 0.11625, 0.11625, 0.11625, 0.11625, 0.11625, 0.11625, 0.1478125, 0.1478125, 0.1478125, 0.1478125, 0.1478125, 0.1478125, 0.1478125, 0.1478125, 0.1478125, 0.1478125, 0.1478125, 0.1478125, 0.1478125, 0.179375, 0.179375, 0.179375, 0.179375, 0.179375, 0.179375, 0.179375, 0.179375, 0.179375, 0.179375, 0.179375, 0.179375, 0.179375, 0.2109375, 0.2109375, 0.2109375, 0.2109375, 0.2109375, 0.2109375, 0.2109375, 0.2109375, 0.2109375, 0.2109375, 0.2109375, 0.2109375, 0.2109375, 0.2425, 0.2425, 0.2425, 0.2425, 0.2425, 0.2425, 0.2425, 0.2425, 0.2425, 0.2425, 0.2425, 0.2425, 0.2425, 0.2740625, 0.2740625, 0.2740625, 0.2740625, 0.2740625, 0.2740625, 0.2740625, 0.2740625, 0.2740625, 0.2740625, 0.2740625, 0.2740625, 0.2740625, 0.305625, 0.305625, 0.305625, 0.305625, 0.305625, 0.305625, 0.305625, 0.305625, 0.305625, 0.305625, 0.305625, 0.305625, 0.305625, 0.3371875, 0.3371875, 0.3371875, 0.3371875, 0.3371875, 0.3371875, 0.3371875, 0.3371875, 0.3371875, 0.3371875, 0.3371875, 0.3371875, 0.3371875, 0.36875, 0.36875, 0.36875, 0.36875, 0.36875, 0.36875, 0.36875, 0.36875, 0.36875, 0.36875, 0.36875, 0.36875, 0.36875, 0.4003125, 0.4003125, 0.4003125, 0.4003125, 0.4003125, 0.4003125, 0.4003125, 0.4003125, 0.4003125, 0.4003125, 0.4003125, 0.4003125, 0.4003125, 0.431875, 0.431875, 0.431875, 0.431875, 0.431875, 0.431875, 0.431875, 0.431875, 0.431875, 0.431875, 0.431875, 0.431875, 0.431875, 0.4634375, 0.4634375, 0.4634375, 0.4634375, 0.4634375, 0.4634375, 0.4634375, 0.4634375, 0.4634375, 0.4634375, 0.4634375, 0.4634375, 0.4634375, 0.495, 0.495, 0.495, 0.495, 0.495, 0.495, 0.495, 0.495, 0.495, 0.495, 0.495, 0.495, 0.495, 0.5265625, 0.5265625, 0.5265625, 0.5265625, 0.5265625, 0.5265625, 0.5265625, 0.5265625, 0.5265625, 0.5265625, 0.5265625, 0.5265625, 0.5265625, 0.558125, 0.558125, 0.558125, 0.558125, 0.558125, 0.558125, 0.558125, 0.558125, 0.558125, 0.558125, 0.558125, 0.558125, 0.558125, 0.5896875, 0.5896875, 0.5896875, 0.5896875, 0.5896875, 0.5896875, 0.5896875, 0.5896875, 0.5896875, 0.5896875, 0.5896875, 0.5896875, 0.5896875, 0.62125, 0.62125, 0.62125, 0.62125, 0.62125, 0.62125, 0.62125, 0.62125, 0.62125, 0.62125, 0.62125, 0.62125, 0.62125, 0.625195313, 0.625195313, 0.625195313, 0.625195313, 0.625195313, 0.625195313, 0.625195313, 0.625195313, 0.625195313, 0.625195313, 0.625195313, 0.625195313, 0.625195313, 0.629140625, 0.629140625, 0.629140625, 0.629140625, 0.629140625, 0.629140625, 0.629140625, 0.629140625, 0.629140625, 0.629140625, 0.629140625, 0.629140625, 0.629140625, 0.63703125, 0.63703125, 0.63703125, 0.63703125, 0.63703125, 0.63703125, 0.63703125, 0.63703125, 0.63703125, 0.63703125, 0.63703125, 0.63703125, 0.63703125, 0.6528125, 0.6528125, 0.6528125, 0.6528125, 0.6528125, 0.6528125, 0.6528125, 0.6528125, 0.6528125, 0.6528125, 0.6528125, 0.6528125, 0.6528125, 0.684375, 0.684375, 0.684375, 0.684375, 0.684375, 0.684375, 0.684375, 0.684375, 0.684375, 0.684375, 0.684375, 0.684375, 0.684375, 0.7159375, 0.7159375, 0.7159375, 0.7159375, 0.7159375, 0.7159375, 0.7159375, 0.7159375, 0.7159375, 0.7159375, 0.7159375, 0.7159375, 0.7159375, 0.7475, 0.7475, 0.7475, 0.7475, 0.7475, 0.7475, 0.7475, 0.7475, 0.7475, 0.7475, 0.7475, 0.7475, 0.7475, 0.76328125, 0.76328125, 0.76328125, 0.76328125, 0.76328125, 0.76328125, 0.76328125, 0.76328125, 0.76328125, 0.76328125, 0.76328125, 0.76328125, 0.76328125, 0.7790625, 0.7790625, 0.7790625, 0.7790625, 0.7790625, 0.7790625, 0.7790625, 0.7790625, 0.7790625, 0.7790625, 0.7790625, 0.7790625, 0.7790625, 0.810625, 0.810625, 0.810625, 0.810625, 0.810625, 0.810625, 0.810625, 0.810625, 0.810625, 0.810625, 0.810625, 0.810625, 0.810625, 0.82640625, 0.82640625, 0.82640625, 0.82640625, 0.82640625, 0.82640625, 0.82640625, 0.82640625, 0.82640625, 0.82640625, 0.82640625, 0.82640625, 0.82640625, 0.8421875, 0.8421875, 0.8421875, 0.8421875, 0.8421875, 0.8421875, 0.8421875, 0.8421875, 0.8421875, 0.8421875, 0.8421875, 0.8421875, 0.8421875, 0.87375, 0.87375, 0.87375, 0.87375, 0.87375, 0.87375, 0.87375, 0.87375, 0.87375, 0.87375, 0.87375, 0.87375, 0.87375, 0.9053125, 0.9053125, 0.9053125, 0.9053125, 0.9053125, 0.9053125, 0.9053125, 0.9053125, 0.9053125, 0.9053125, 0.9053125, 0.9053125, 0.9053125, 0.936875, 0.936875, 0.936875, 0.936875, 0.936875, 0.936875, 0.936875, 0.936875, 0.936875, 0.936875, 0.936875, 0.936875, 0.936875, 1, 1, 1, 1, 1, 1, 1, 1, 1, 1, 1, 1, 1, 1, 1], degree=14))
            ThreePointArc((-6.379554183, 0.619822851), (-6.578477057, -1.52319194), (-8.441487365, -2.600816779))
        make_face()
        with BuildLine():
            add(Edge.make_bspline(
                [(-26.3254835, -3.667013126), (-25.88501641, -5.291831431), (-25.29377098, -6.855009859), (-23.845193985, -9.80629411), (-22.98792657, -11.194349378), (-21.051401006, -13.752352434), (-19.972214517, -14.922264044), (-17.642414844, -17.011136269), (-16.391877744, -17.930076055), (-13.774181132, -19.49521083), (-12.407098951, -20.141400668), (-9.613043017, -21.150681858), (-8.186144708, -21.513783431), (-5.328810088, -21.957896657), (-3.898444365, -22.038932986), (-1.087949282, -21.930758945), (0.292117033, -21.741586229), (2.952832896, -21.114730733), (4.233429246, -20.677096627), (6.652371052, -19.583645356), (7.790674993, -18.927885533), (9.889971566, -17.435500393), (10.850935673, -16.598938448), (12.56932106, -14.787435905), (13.326727542, -13.812561896), (14.621247223, -11.770130786), (15.158359498, -10.70264063), (16.00525724, -8.521867273), (16.315055224, -7.408648574), (16.709831654, -5.182520117), (16.79483508, -4.069669804), (16.751503646, -1.887722789), (16.623204755, -0.818678144), (16.172803424, 1.236551533), (15.85074605, 2.22269385), (15.039192621, 4.078780417), (14.549748502, 4.948692799), (13.435152517, 6.545872807), (12.810057002, 7.273120414), (11.459621106, 8.566197708), (10.73433891, 9.132019695), (8.46432492, 10.571334953), (6.826310345, 11.182779689), (3.596803483, 11.720427957), (2.006859472, 11.647480976), (-0.874358563, 10.942499326), (-2.164612563, 10.311829803), (-4.281093265, 8.698405735), (-5.106975392, 7.717261628), (-6.237076936, 5.644996058), (-6.54165034, 4.555429578), (-6.679047096, 2.494871997), (-6.512822326, 1.525102008), (-6.179406175, 0.700777066)],
                knots=[0, 0, 0, 0, 0.03125, 0.03125, 0.0625, 0.0625, 0.09375, 0.09375, 0.125, 0.125, 0.15625, 0.15625, 0.1875, 0.1875, 0.21875, 0.21875, 0.25, 0.25, 0.28125, 0.28125, 0.3125, 0.3125, 0.34375, 0.34375, 0.375, 0.375, 0.40625, 0.40625, 0.4375, 0.4375, 0.46875, 0.46875, 0.5, 0.5, 0.53125, 0.53125, 0.5625, 0.5625, 0.59375, 0.59375, 0.625, 0.625, 0.6875, 0.6875, 0.75, 0.75, 0.8125, 0.8125, 0.875, 0.875, 0.9375, 0.9375, 1, 1, 1, 1], degree=3))
            Line((-26.3254835, -3.667013126), (-8.431236894, -2.816473307))
            ThreePointArc((-8.431236894, -2.816473307), (-6.396649217, -1.639602622), (-6.179406175, 0.700777066))
        make_face(mode=Mode.SUBTRACT)
    extrude(amount=MOVE_FACE1_DEPTH)

    # Sketch11 → Cut-Extrude2 (cut, through all)
    with BuildSketch(Plane.ZY):
        with Locations((-6.553216354, -4.588611491)):
            Circle(SKETCH11_R)
        with Locations((-4.588611491, 6.553216354)):
            Circle(SKETCH11_R)
        with Locations((6.553216354, 4.588611491)):
            Circle(SKETCH11_R)
    extrude(amount=-CUT_EXTRUDE2_DEPTH, mode=Mode.SUBTRACT)


solid = part.part
